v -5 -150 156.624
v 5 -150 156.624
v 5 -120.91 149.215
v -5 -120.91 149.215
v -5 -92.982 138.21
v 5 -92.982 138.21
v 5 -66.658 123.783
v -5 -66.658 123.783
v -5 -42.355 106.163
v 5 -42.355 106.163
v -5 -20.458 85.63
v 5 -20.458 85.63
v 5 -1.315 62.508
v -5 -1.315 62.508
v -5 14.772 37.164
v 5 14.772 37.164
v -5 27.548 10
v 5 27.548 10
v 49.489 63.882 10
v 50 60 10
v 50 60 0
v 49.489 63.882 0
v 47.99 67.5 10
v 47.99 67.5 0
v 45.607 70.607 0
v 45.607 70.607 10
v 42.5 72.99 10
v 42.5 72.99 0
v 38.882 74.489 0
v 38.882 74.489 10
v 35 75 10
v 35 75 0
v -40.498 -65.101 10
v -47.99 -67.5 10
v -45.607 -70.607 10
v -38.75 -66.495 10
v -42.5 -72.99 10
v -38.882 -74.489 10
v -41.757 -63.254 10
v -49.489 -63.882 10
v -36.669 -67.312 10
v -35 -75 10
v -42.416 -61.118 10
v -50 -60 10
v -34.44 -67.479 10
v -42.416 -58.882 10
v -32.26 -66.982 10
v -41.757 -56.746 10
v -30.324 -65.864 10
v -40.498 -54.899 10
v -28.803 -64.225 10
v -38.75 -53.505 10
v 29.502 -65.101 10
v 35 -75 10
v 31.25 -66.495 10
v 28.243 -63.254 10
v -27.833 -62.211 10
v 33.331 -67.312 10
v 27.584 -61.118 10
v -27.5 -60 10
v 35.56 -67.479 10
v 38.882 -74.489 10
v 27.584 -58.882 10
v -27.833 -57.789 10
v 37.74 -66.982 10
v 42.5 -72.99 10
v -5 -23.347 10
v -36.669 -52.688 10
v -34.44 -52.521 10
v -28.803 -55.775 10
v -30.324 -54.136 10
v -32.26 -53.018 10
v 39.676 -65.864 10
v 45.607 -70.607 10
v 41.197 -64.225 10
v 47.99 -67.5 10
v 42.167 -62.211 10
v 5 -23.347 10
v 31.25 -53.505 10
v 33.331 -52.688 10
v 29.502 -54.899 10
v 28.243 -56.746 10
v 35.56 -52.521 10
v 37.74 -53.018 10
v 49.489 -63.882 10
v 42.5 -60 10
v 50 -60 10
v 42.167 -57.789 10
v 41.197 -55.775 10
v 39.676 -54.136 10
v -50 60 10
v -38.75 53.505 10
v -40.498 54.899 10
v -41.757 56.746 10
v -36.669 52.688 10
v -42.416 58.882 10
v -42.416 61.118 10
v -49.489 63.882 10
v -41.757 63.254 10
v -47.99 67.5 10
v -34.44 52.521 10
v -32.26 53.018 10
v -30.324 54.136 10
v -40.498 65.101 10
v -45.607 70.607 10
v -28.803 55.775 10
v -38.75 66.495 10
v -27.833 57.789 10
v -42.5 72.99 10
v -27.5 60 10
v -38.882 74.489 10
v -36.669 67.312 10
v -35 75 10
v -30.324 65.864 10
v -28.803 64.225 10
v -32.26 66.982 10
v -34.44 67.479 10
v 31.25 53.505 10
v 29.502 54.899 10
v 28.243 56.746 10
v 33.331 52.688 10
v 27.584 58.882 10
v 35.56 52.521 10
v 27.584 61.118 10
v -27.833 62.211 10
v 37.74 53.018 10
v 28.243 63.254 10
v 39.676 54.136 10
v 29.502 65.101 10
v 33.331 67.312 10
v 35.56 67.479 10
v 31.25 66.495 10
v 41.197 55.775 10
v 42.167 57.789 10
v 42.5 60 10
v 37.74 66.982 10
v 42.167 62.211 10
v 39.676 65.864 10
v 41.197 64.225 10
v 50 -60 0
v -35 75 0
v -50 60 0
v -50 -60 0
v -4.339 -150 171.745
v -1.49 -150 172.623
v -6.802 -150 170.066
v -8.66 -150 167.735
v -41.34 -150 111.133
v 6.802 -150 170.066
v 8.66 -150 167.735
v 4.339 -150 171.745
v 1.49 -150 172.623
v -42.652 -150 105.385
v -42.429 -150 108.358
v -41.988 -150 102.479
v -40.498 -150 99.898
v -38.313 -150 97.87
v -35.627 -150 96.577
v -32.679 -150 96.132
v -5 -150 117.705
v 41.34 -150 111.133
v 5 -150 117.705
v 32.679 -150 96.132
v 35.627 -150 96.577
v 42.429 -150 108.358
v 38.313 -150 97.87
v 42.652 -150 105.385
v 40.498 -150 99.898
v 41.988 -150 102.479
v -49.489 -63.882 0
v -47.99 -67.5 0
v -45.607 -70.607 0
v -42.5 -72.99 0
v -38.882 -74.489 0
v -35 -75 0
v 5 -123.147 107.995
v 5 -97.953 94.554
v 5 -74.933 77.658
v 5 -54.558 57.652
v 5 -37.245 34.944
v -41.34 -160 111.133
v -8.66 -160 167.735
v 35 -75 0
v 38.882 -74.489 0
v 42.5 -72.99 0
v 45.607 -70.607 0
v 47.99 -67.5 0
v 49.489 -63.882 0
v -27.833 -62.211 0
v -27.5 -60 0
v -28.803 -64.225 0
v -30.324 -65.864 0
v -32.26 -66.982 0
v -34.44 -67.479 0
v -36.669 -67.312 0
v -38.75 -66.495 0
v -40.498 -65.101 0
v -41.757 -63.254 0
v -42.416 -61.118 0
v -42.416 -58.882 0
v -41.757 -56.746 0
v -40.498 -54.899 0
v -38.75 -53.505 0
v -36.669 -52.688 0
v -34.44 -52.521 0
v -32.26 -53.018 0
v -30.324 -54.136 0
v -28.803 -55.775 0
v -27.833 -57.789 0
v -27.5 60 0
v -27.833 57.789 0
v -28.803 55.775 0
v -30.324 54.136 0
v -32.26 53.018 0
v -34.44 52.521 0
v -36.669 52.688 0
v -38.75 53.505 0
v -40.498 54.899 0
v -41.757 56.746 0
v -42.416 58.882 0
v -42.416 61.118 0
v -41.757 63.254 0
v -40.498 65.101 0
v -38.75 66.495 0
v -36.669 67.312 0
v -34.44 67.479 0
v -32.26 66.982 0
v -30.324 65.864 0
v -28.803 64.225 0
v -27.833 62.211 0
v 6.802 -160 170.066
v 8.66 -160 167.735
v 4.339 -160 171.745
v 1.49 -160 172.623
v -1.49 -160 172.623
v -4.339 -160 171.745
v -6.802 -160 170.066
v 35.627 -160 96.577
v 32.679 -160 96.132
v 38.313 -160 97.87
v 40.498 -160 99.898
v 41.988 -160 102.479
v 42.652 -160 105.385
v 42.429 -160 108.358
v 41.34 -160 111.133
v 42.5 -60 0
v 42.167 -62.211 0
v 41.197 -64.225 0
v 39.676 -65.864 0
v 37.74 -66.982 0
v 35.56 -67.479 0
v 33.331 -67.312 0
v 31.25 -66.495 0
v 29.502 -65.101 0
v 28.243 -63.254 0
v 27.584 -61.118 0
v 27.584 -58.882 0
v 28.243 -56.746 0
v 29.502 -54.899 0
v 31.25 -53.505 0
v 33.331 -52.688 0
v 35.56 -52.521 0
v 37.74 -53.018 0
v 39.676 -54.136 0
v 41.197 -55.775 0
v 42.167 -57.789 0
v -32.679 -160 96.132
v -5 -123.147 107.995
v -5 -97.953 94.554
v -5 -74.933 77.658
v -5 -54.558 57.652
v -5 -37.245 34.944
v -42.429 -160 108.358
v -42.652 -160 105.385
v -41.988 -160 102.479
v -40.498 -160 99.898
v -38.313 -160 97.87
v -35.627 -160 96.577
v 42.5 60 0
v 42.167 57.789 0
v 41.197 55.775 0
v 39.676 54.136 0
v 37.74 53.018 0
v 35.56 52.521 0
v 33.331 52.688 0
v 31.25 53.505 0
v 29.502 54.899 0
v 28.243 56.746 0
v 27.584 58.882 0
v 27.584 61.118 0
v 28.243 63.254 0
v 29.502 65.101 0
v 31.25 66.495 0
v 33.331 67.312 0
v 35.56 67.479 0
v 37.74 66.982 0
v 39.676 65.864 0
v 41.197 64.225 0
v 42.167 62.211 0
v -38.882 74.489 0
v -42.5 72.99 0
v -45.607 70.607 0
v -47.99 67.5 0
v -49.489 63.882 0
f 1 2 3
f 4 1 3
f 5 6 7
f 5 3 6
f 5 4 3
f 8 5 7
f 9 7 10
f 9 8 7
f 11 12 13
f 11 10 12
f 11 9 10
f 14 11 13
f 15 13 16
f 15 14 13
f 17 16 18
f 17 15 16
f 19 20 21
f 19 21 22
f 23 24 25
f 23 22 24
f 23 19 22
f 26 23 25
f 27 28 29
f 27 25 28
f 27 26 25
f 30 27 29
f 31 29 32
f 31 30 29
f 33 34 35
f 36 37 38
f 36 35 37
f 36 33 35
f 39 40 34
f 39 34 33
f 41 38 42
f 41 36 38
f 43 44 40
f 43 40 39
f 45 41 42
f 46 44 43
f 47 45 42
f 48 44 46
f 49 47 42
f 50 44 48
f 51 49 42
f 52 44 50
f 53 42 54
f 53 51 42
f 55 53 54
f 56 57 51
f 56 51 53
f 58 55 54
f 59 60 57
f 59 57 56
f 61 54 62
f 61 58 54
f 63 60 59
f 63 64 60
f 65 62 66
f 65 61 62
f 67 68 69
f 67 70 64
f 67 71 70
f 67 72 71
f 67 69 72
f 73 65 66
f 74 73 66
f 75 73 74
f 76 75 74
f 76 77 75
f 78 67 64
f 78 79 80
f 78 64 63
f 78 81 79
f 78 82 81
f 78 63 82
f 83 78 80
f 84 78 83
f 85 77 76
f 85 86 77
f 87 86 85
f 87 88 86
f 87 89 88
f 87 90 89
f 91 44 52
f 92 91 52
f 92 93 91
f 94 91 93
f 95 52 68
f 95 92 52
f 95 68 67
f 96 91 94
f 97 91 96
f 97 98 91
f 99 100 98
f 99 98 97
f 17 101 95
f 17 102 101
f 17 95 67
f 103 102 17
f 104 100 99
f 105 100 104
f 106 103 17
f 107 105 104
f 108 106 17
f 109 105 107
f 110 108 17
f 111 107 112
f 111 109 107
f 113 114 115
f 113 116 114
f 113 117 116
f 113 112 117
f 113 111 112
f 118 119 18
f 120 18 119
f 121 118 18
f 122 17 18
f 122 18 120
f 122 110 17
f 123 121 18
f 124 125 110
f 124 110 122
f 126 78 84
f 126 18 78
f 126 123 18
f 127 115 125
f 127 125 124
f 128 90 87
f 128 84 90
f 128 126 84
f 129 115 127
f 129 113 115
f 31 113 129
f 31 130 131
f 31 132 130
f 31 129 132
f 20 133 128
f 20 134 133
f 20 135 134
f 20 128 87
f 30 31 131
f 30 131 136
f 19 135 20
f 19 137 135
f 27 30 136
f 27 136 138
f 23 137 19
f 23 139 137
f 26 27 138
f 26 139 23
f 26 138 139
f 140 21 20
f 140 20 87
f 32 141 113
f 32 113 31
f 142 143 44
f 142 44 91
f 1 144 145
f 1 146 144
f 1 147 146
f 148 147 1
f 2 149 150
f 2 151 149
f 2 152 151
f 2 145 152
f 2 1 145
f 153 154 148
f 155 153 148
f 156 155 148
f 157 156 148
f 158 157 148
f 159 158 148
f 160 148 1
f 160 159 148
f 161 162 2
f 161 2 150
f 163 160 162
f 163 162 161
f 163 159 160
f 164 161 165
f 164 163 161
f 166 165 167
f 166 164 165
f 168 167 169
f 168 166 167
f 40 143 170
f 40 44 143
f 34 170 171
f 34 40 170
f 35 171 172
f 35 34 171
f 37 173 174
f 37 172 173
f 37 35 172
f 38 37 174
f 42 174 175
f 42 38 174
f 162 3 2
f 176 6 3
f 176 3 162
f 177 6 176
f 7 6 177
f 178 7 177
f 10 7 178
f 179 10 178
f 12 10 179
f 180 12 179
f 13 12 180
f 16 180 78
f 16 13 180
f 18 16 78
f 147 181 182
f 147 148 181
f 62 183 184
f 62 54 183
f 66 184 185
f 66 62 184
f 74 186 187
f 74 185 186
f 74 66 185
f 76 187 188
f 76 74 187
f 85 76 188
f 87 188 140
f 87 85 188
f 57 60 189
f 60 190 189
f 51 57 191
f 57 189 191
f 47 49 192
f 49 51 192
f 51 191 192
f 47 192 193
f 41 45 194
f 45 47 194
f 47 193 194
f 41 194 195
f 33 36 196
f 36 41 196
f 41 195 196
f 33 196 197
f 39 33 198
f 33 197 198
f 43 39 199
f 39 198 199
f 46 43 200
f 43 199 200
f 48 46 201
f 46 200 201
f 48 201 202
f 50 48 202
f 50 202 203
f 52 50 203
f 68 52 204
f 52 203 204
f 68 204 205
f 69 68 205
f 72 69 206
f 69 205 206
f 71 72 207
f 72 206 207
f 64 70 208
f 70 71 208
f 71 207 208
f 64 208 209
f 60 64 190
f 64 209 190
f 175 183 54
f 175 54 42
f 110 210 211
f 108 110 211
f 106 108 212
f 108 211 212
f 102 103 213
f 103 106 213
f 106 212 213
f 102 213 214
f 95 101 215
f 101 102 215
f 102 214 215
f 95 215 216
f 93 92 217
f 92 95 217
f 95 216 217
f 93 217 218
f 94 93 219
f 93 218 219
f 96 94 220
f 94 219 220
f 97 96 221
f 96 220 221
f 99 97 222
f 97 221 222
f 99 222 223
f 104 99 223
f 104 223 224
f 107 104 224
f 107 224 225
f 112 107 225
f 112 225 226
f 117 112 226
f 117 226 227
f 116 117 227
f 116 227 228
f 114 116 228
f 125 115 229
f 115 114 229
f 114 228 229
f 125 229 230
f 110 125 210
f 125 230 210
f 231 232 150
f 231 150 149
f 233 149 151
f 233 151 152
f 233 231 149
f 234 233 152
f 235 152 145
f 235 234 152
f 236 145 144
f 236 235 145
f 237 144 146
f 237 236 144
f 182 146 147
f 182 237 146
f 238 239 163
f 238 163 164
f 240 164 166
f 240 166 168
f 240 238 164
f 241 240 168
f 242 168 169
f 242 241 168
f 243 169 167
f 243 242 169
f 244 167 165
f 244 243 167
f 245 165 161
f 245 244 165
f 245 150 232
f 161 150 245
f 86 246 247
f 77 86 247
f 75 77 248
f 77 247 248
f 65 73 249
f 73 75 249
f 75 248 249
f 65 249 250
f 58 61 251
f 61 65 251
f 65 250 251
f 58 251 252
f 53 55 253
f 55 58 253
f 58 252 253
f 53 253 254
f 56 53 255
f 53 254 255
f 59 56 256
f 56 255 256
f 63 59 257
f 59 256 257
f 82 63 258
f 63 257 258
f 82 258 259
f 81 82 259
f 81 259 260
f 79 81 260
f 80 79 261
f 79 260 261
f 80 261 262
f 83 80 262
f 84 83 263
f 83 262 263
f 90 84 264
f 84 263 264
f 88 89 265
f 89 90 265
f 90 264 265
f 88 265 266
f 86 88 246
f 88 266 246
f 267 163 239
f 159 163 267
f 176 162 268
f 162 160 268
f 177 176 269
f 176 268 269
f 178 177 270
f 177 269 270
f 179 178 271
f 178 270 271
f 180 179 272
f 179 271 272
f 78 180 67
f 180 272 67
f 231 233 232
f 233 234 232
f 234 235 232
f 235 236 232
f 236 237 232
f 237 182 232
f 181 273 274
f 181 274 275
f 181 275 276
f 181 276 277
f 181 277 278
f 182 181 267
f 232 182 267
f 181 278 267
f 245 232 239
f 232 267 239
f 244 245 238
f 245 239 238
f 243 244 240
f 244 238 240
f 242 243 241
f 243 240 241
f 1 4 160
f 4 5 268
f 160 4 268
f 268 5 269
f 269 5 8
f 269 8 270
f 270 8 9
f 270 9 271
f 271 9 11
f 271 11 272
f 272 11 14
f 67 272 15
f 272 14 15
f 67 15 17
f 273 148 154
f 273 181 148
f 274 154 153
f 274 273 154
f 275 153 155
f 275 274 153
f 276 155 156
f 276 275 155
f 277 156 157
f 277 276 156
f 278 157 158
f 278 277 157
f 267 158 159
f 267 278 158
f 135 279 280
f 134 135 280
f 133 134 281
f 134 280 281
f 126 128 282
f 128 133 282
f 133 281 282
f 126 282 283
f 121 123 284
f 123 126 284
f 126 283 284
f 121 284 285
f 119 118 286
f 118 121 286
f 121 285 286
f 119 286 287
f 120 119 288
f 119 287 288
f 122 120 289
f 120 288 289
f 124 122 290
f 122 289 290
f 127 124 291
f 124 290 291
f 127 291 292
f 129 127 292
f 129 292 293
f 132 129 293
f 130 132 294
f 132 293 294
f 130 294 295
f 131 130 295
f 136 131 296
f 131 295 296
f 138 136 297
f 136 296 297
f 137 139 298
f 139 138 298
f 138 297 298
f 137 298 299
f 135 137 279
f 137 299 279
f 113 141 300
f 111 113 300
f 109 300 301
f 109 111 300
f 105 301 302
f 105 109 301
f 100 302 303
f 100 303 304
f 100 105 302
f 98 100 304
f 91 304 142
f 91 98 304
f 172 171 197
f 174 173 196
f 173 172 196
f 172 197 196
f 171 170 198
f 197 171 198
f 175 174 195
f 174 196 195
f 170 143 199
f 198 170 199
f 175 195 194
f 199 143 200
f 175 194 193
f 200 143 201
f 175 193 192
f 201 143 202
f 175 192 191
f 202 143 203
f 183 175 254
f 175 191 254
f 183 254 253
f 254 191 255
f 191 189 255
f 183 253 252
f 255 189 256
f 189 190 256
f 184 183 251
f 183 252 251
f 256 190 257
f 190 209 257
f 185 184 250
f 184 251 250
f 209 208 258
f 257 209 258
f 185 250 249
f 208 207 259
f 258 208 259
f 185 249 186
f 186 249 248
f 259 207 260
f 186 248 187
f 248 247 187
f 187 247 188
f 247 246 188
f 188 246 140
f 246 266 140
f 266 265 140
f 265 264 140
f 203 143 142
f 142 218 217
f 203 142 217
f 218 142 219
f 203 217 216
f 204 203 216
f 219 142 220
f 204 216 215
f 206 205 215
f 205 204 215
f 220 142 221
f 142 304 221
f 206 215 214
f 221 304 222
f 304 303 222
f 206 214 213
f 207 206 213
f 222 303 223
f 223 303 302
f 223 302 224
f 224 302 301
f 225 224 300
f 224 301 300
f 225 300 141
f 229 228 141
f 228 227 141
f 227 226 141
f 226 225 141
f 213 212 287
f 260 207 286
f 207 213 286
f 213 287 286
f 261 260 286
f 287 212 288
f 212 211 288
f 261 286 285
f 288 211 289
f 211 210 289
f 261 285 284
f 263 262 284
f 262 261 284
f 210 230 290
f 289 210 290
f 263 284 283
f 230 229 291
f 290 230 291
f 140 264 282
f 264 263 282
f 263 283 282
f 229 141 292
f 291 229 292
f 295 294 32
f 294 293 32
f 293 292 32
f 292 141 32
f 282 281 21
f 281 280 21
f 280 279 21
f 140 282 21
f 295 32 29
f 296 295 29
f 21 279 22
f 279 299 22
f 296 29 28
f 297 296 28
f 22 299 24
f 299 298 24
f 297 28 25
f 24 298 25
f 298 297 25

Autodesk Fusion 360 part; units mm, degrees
sketch "Sketch1" plane through (0, 0, 0) normal (0, 0, 1) x (1, 0, 0) in component "Mounting Plate1"
  line L0 (-50, 75) -> (50, 75)
  line L1 (50, 75) -> (50, -75)
  line L2 (50, -75) -> (-50, -75)
  line L3 (-50, -75) -> (-50, 75)
  line L4 (-50, 75) -> (50, -75) construction
  line L5 (50, 75) -> (-50, -75) construction
  circle A0 centre (-35, 60) radius 7.5
  circle A1 centre (35, 60) radius 7.5
  line L6 (0, 0) -> (21.7934, 0) construction
  circle A2 centre (-35, -60) radius 7.5
  circle A3 centre (35, -60) radius 7.5
  dimension "d1" = 100
  dimension "d2" = 150
  dimension "d3" = 15
  dimension "d4" = 15
  dimension "d5" = 15
  dimension "d6" = 15
extrude "Extrude1" add sketch "Sketch1" along normal blind 10 makes body 1 in component "Mounting Plate1"
fillet "Fillet1" radius 15 4 edges at (-50, 75, 5) (50, 75, 5) (50, -75, 5) (-50, -75, 5) on bodies 1 in component "Mounting Plate1"
ref_plane "WorkPlane1" through (0, -150, 0) normal (0, 1, 0) x (0, 0, 1) in component "Mounting Plate1"
sketch "Sketch2" plane through (0, -150, 0) normal (0, 1, 0) x (1, 0, 0) in component "Mounting Plate1"
  line L0 (-35, -10) -> (35, -10)
  line L1 (0, 0) -> (0, -125) construction
  line L2 (-50, -96.1325) -> (0, -182.735)
  line L3 (0, -182.735) -> (50, -96.1325)
  line L4 (50, -96.1325) -> (-50, -96.1325)
  point P0 (0, -125)
  dimension "d11" = 125
  dimension "d12" = 100
extrude "Extrude2" add sketch "Sketch2" against normal blind 10 separate body makes body 2 in component "Mounting Plate1"
fillet "Fillet2" radius 10 3 edges at (0, -155, 182.735) (50, -155, 96.1325) (-50, -155, 96.1325) on bodies 2 in component "Mounting Plate1"
sketch "Sketch3" plane through (0, 0, 0) normal (1, 0, 0) x (0, 0, -1) in component "Mounting Plate1"
  line L0 (-10, 75) -> (-10, -75)
  line L1 (-96.1325, -150) -> (-172.735, -150)
  arc A0 (-10, 27.5478) -> (-156.6245, -150) centre (77.7015, -194.1962) ccw
  arc A1 (-10, -23.3468) -> (-117.7051, -150) centre (74.486, -204.3157) ccw
extrude "Extrude3" add sketch "Sketch3" along normal mid plane 10 bodies 1 2 in component "Mounting Plate1"
component "Mounting Plate1" placed x (1, 0, 0) y (0, 1, 0) z (0, 0, 1) at (0, 0, 0)
equation "d2 = ( 6 * 25 ) * 1 mm"
